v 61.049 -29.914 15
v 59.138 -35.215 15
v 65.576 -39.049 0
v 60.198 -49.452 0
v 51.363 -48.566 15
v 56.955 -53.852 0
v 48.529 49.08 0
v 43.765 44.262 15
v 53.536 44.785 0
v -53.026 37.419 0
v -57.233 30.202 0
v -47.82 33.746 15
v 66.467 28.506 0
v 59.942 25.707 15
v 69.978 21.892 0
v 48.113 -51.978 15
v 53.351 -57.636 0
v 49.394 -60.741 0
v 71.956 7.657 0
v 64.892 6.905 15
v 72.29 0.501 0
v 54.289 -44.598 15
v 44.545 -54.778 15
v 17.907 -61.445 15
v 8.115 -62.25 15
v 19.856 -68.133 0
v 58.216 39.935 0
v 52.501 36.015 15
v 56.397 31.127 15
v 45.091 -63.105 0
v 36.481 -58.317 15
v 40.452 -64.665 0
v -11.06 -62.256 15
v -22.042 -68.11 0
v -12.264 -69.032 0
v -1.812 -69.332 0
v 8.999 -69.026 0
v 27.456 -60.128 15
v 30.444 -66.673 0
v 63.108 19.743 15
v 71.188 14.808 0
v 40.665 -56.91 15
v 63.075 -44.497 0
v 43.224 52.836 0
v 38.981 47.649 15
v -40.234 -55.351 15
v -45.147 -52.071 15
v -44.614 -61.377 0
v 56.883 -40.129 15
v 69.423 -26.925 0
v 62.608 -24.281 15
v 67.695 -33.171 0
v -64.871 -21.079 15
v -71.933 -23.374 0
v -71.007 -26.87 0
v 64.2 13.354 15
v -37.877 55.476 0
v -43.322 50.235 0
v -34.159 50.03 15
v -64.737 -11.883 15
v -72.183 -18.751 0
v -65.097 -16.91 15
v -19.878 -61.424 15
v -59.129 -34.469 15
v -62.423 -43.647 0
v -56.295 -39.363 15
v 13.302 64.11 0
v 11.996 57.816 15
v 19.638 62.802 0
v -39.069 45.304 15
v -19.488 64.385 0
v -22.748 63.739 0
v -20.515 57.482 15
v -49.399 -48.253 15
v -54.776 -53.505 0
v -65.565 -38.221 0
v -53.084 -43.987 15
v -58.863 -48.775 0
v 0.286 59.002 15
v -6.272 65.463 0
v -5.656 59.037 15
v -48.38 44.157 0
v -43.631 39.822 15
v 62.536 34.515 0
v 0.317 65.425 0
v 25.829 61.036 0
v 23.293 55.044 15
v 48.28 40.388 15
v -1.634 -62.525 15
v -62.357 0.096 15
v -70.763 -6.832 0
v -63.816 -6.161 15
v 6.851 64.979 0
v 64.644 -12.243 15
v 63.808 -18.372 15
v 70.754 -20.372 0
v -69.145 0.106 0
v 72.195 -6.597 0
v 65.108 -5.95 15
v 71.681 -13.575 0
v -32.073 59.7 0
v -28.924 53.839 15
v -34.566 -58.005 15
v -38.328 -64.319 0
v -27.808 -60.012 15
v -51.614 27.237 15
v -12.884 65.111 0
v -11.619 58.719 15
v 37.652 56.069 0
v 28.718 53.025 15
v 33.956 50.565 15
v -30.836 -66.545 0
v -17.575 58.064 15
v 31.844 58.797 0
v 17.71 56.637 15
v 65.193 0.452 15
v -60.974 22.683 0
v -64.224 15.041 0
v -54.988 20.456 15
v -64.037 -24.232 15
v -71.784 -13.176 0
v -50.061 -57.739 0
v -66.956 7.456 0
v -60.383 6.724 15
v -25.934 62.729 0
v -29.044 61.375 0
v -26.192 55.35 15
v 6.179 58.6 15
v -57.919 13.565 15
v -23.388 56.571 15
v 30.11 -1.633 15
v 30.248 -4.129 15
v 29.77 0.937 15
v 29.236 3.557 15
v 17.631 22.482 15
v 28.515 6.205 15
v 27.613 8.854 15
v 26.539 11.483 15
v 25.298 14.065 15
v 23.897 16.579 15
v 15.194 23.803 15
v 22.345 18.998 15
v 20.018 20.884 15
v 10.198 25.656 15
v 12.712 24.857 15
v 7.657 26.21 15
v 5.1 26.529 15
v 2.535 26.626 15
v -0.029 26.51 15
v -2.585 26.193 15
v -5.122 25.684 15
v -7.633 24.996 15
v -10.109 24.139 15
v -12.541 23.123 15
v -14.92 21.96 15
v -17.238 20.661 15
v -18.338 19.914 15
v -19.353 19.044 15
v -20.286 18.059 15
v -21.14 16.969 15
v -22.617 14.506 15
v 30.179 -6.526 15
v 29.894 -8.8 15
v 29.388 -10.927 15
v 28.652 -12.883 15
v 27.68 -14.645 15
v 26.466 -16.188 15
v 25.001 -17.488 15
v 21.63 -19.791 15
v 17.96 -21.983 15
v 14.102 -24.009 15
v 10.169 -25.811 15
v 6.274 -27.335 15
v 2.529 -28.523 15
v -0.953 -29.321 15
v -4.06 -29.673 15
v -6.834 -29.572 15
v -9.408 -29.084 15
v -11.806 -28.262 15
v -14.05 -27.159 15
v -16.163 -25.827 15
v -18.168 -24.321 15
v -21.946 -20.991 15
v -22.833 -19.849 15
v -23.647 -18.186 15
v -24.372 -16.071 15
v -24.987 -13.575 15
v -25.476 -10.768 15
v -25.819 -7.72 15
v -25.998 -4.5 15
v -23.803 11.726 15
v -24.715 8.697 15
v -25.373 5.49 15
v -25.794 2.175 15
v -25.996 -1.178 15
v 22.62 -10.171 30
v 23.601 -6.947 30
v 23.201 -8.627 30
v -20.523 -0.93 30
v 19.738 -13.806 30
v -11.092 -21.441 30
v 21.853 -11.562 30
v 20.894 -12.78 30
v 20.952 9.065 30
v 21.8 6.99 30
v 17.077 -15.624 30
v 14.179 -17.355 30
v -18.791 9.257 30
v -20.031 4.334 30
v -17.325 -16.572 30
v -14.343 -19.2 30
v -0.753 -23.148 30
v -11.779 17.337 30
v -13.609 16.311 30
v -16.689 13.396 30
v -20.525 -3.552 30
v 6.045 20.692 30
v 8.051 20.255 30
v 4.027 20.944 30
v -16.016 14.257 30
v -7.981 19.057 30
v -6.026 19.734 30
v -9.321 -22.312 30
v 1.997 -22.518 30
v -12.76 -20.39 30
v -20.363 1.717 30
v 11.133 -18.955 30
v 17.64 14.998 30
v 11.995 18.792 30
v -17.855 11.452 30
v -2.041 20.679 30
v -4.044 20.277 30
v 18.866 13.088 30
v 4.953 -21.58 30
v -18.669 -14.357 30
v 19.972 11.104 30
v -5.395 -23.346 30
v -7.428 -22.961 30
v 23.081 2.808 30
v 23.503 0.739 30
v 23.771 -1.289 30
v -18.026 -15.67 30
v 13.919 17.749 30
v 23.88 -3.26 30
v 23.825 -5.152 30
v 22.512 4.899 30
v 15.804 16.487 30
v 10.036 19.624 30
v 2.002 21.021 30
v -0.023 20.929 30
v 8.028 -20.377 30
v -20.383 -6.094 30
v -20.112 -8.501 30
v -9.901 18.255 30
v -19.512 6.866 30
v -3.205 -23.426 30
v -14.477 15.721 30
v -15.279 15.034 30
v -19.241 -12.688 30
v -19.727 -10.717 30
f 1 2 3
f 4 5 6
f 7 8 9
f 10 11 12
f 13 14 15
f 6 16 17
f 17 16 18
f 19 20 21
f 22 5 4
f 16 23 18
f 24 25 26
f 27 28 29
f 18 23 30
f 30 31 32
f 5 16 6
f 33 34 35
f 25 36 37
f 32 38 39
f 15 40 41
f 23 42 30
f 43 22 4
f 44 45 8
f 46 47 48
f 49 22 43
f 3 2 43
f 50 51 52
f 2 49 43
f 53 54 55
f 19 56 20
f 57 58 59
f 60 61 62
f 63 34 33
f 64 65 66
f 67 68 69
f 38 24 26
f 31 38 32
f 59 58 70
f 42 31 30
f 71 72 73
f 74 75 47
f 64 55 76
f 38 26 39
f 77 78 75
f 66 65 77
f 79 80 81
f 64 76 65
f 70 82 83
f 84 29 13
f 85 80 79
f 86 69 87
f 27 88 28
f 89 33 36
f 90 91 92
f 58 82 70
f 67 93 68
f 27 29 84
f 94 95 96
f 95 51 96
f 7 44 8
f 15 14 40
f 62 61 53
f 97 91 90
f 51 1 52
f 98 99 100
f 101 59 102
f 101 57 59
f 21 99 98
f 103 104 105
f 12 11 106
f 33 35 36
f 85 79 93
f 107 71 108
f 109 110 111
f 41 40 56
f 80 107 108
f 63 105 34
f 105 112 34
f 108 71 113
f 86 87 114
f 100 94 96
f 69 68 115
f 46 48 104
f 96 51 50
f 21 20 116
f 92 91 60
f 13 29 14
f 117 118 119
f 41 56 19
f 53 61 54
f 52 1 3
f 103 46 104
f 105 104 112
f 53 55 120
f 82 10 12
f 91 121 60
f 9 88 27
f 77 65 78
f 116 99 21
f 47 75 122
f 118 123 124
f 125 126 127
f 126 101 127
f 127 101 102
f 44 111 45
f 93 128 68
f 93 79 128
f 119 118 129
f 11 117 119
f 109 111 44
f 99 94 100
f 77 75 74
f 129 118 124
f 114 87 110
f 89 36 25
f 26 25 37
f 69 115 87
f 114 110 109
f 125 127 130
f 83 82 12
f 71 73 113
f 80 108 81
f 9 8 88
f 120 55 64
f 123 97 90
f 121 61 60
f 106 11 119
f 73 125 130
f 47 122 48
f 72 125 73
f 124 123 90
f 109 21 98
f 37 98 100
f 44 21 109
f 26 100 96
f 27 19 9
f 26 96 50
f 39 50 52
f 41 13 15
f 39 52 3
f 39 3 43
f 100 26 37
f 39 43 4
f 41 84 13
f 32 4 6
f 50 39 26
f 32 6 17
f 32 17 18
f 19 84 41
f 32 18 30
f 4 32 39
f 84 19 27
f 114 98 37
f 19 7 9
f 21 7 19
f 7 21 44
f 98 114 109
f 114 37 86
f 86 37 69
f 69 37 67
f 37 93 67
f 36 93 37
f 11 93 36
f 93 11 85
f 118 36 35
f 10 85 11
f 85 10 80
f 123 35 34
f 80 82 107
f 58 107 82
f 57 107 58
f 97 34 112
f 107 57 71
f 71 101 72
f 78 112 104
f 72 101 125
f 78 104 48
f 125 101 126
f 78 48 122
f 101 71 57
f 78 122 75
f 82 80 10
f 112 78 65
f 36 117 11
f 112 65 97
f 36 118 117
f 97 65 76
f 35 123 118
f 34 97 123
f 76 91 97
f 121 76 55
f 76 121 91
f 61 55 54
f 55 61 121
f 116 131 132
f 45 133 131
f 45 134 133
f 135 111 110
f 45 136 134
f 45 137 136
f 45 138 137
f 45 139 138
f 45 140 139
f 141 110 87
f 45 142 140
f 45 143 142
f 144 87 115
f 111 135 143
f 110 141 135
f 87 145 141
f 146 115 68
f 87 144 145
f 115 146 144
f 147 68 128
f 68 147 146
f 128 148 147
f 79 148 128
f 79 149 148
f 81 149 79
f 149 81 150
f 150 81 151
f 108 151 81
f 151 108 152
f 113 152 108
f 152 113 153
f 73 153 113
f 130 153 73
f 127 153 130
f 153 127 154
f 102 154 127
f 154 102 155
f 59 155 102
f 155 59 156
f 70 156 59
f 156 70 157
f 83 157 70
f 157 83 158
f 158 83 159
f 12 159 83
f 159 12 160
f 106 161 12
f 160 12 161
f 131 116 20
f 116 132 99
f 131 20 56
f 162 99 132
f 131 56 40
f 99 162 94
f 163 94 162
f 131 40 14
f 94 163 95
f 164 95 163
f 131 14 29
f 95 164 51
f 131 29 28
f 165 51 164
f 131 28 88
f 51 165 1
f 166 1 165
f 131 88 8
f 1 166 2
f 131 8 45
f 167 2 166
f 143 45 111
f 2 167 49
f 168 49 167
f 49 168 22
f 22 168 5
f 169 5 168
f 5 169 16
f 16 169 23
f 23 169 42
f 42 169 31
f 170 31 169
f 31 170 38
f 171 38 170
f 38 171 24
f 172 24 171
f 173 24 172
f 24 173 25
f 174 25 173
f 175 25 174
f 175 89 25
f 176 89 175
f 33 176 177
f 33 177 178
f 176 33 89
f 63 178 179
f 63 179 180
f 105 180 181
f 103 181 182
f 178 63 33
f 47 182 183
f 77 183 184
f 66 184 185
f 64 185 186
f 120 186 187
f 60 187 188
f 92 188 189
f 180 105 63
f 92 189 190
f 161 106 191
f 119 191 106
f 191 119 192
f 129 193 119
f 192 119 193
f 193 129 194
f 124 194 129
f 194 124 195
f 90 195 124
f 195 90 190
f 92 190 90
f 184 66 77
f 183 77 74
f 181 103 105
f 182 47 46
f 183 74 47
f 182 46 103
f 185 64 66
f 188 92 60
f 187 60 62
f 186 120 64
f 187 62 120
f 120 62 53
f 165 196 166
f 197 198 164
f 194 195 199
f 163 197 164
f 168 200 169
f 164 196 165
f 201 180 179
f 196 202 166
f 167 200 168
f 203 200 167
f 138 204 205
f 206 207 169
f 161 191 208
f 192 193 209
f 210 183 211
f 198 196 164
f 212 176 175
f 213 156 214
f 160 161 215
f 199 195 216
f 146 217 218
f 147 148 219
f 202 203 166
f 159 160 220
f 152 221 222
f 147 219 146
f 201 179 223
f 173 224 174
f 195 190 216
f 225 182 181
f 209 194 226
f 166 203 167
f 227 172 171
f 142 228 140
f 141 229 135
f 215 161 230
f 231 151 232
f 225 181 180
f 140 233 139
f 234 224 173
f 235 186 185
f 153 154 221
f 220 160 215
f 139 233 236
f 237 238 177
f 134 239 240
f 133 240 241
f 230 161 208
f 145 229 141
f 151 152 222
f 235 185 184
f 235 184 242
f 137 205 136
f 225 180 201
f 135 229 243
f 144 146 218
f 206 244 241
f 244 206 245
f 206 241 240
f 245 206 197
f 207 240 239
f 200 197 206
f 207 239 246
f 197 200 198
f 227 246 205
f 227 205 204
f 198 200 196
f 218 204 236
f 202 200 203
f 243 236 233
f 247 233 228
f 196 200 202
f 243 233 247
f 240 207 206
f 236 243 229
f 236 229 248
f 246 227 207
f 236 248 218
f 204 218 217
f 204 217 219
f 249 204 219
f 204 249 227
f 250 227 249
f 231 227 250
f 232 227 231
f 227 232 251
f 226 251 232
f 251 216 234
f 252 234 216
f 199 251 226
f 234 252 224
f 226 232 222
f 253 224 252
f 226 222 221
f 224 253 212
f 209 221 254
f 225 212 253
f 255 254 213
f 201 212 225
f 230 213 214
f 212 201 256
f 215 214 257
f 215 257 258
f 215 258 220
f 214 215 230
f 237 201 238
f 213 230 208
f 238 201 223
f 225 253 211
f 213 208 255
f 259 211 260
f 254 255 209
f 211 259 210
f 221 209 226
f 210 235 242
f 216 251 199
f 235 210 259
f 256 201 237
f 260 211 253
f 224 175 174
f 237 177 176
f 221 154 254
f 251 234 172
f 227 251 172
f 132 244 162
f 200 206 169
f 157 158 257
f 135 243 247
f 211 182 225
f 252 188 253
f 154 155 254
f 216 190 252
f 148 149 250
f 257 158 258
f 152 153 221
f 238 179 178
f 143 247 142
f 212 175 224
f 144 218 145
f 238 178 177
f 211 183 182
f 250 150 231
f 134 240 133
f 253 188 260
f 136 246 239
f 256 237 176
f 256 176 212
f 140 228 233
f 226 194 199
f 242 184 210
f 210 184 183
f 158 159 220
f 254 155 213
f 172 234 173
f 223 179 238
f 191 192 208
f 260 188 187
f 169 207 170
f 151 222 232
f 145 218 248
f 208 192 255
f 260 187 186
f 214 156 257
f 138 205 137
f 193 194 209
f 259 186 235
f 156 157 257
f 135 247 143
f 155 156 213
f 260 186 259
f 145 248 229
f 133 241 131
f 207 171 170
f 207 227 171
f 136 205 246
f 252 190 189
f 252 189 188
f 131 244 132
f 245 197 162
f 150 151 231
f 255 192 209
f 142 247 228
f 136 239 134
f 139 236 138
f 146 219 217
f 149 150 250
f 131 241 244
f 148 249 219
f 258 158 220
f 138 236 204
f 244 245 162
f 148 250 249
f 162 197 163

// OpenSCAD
// file: hill-5.scad
use <hillpolygon.scad>;

% translate([0,0,155/2]) cube(size=[240, 153, 155], center=true);

hill5();

module hill5() {
   hillFromPolygon(angle=25) hill5Polygon();
}

module hill5Polygon() {
	rotate([0,0,30]) translate([55,-15,0])
  polygon(points=
    [[-39.685, 80.503], [-33.602, 77.830], [-27.700, 74.829], [-22.013, 71.501], [-16.577, 67.848], [-11.425, 63.870], [-6.592, 59.569], [-2.114, 54.944], [1.976, 49.998], [5.642, 44.731], [8.851, 39.145], [11.567, 33.240], [13.756, 27.017], [15.384, 20.477], [16.415, 13.623], [16.815, 6.453], [16.549, -1.030], [14.055, -7.770], [11.144, -14.347], [7.855, -20.711], [4.224, -26.811], [0.290, -32.597], [-3.911, -38.020], [-8.340, -43.029], [-12.960, -47.574], [-17.734, -51.605], [-22.624, -55.073], [-27.593, -57.926], [-32.602, -60.115], [-37.615, -61.590], [-42.594, -62.300], [-47.502, -62.196], [-52.300, -61.228], [-61.971, -57.963], [-71.871, -53.933], [-81.720, -49.278], [-91.235, -44.137], [-100.137, -38.652], [-108.144, -32.964], [-114.977, -27.212], [-120.353, -21.538], [-124.325, -15.847], [-127.224, -9.973], [-129.190, -3.949], [-130.364, 2.191], [-130.884, 8.412], [-130.892, 14.682], [-129.929, 27.234], [-128.983, 30.724], [-126.888, 34.853], [-123.755, 39.481], [-119.698, 44.465], [-114.828, 49.664], [-109.258, 54.935], [-103.099, 60.138], [-96.463, 65.131], [-89.464, 69.772], [-82.212, 73.919], [-74.820, 77.431], [-67.400, 80.166], [-60.065, 81.982], [-52.926, 82.738], [-49.465, 82.674], [-46.095, 82.292], [-42.831, 81.574]]
    , paths=
    [[0, 1, 2, 3, 4, 5, 6, 7, 8, 9, 10, 11, 12, 13, 14, 15, 16, 17, 18, 19, 20, 21, 22, 23, 24, 25, 26, 27, 28, 29, 30, 31, 32, 33, 34, 35, 36, 37, 38, 39, 40, 41, 42, 43, 44, 45, 46, 47, 48, 49, 50, 51, 52, 53, 54, 55, 56, 57, 58, 59, 60, 61, 62, 63, 64, 0, 0]]
    );
}
// file: hillpolygon.scad
module hillFromPolygon(height = 23, angle = 30, convexity = 5) {
   $fn = 100;

   // estRadius calculates an estimated radius for the hill assuming that I've filled most of the
   // depth of the build plate (Y dimension) with the polygon. This is then used to scale the roof of
   // the polyhedral.
   estRadius = 0.95 * 150 / 2;
   inset = height * tan(angle);
   scaleFactor = (estRadius - inset) / estRadius;

   linear_extrude(height = height, convexity = convexity, scale=scaleFactor) child(0);
}
// main file
use <hillpolygon.scad>
use <hill-5.scad>

% translate([0,0,155/2]) cube(size=[240, 153, 155], center=true);

hillFromPolygon(angle=25, height=15) hill5Polygon();
translate([0,0,15]) scale([.4,.4,1]) rotate([0,0,23]) hillFromPolygon(angle=45, height=15) hill5Polygon();
